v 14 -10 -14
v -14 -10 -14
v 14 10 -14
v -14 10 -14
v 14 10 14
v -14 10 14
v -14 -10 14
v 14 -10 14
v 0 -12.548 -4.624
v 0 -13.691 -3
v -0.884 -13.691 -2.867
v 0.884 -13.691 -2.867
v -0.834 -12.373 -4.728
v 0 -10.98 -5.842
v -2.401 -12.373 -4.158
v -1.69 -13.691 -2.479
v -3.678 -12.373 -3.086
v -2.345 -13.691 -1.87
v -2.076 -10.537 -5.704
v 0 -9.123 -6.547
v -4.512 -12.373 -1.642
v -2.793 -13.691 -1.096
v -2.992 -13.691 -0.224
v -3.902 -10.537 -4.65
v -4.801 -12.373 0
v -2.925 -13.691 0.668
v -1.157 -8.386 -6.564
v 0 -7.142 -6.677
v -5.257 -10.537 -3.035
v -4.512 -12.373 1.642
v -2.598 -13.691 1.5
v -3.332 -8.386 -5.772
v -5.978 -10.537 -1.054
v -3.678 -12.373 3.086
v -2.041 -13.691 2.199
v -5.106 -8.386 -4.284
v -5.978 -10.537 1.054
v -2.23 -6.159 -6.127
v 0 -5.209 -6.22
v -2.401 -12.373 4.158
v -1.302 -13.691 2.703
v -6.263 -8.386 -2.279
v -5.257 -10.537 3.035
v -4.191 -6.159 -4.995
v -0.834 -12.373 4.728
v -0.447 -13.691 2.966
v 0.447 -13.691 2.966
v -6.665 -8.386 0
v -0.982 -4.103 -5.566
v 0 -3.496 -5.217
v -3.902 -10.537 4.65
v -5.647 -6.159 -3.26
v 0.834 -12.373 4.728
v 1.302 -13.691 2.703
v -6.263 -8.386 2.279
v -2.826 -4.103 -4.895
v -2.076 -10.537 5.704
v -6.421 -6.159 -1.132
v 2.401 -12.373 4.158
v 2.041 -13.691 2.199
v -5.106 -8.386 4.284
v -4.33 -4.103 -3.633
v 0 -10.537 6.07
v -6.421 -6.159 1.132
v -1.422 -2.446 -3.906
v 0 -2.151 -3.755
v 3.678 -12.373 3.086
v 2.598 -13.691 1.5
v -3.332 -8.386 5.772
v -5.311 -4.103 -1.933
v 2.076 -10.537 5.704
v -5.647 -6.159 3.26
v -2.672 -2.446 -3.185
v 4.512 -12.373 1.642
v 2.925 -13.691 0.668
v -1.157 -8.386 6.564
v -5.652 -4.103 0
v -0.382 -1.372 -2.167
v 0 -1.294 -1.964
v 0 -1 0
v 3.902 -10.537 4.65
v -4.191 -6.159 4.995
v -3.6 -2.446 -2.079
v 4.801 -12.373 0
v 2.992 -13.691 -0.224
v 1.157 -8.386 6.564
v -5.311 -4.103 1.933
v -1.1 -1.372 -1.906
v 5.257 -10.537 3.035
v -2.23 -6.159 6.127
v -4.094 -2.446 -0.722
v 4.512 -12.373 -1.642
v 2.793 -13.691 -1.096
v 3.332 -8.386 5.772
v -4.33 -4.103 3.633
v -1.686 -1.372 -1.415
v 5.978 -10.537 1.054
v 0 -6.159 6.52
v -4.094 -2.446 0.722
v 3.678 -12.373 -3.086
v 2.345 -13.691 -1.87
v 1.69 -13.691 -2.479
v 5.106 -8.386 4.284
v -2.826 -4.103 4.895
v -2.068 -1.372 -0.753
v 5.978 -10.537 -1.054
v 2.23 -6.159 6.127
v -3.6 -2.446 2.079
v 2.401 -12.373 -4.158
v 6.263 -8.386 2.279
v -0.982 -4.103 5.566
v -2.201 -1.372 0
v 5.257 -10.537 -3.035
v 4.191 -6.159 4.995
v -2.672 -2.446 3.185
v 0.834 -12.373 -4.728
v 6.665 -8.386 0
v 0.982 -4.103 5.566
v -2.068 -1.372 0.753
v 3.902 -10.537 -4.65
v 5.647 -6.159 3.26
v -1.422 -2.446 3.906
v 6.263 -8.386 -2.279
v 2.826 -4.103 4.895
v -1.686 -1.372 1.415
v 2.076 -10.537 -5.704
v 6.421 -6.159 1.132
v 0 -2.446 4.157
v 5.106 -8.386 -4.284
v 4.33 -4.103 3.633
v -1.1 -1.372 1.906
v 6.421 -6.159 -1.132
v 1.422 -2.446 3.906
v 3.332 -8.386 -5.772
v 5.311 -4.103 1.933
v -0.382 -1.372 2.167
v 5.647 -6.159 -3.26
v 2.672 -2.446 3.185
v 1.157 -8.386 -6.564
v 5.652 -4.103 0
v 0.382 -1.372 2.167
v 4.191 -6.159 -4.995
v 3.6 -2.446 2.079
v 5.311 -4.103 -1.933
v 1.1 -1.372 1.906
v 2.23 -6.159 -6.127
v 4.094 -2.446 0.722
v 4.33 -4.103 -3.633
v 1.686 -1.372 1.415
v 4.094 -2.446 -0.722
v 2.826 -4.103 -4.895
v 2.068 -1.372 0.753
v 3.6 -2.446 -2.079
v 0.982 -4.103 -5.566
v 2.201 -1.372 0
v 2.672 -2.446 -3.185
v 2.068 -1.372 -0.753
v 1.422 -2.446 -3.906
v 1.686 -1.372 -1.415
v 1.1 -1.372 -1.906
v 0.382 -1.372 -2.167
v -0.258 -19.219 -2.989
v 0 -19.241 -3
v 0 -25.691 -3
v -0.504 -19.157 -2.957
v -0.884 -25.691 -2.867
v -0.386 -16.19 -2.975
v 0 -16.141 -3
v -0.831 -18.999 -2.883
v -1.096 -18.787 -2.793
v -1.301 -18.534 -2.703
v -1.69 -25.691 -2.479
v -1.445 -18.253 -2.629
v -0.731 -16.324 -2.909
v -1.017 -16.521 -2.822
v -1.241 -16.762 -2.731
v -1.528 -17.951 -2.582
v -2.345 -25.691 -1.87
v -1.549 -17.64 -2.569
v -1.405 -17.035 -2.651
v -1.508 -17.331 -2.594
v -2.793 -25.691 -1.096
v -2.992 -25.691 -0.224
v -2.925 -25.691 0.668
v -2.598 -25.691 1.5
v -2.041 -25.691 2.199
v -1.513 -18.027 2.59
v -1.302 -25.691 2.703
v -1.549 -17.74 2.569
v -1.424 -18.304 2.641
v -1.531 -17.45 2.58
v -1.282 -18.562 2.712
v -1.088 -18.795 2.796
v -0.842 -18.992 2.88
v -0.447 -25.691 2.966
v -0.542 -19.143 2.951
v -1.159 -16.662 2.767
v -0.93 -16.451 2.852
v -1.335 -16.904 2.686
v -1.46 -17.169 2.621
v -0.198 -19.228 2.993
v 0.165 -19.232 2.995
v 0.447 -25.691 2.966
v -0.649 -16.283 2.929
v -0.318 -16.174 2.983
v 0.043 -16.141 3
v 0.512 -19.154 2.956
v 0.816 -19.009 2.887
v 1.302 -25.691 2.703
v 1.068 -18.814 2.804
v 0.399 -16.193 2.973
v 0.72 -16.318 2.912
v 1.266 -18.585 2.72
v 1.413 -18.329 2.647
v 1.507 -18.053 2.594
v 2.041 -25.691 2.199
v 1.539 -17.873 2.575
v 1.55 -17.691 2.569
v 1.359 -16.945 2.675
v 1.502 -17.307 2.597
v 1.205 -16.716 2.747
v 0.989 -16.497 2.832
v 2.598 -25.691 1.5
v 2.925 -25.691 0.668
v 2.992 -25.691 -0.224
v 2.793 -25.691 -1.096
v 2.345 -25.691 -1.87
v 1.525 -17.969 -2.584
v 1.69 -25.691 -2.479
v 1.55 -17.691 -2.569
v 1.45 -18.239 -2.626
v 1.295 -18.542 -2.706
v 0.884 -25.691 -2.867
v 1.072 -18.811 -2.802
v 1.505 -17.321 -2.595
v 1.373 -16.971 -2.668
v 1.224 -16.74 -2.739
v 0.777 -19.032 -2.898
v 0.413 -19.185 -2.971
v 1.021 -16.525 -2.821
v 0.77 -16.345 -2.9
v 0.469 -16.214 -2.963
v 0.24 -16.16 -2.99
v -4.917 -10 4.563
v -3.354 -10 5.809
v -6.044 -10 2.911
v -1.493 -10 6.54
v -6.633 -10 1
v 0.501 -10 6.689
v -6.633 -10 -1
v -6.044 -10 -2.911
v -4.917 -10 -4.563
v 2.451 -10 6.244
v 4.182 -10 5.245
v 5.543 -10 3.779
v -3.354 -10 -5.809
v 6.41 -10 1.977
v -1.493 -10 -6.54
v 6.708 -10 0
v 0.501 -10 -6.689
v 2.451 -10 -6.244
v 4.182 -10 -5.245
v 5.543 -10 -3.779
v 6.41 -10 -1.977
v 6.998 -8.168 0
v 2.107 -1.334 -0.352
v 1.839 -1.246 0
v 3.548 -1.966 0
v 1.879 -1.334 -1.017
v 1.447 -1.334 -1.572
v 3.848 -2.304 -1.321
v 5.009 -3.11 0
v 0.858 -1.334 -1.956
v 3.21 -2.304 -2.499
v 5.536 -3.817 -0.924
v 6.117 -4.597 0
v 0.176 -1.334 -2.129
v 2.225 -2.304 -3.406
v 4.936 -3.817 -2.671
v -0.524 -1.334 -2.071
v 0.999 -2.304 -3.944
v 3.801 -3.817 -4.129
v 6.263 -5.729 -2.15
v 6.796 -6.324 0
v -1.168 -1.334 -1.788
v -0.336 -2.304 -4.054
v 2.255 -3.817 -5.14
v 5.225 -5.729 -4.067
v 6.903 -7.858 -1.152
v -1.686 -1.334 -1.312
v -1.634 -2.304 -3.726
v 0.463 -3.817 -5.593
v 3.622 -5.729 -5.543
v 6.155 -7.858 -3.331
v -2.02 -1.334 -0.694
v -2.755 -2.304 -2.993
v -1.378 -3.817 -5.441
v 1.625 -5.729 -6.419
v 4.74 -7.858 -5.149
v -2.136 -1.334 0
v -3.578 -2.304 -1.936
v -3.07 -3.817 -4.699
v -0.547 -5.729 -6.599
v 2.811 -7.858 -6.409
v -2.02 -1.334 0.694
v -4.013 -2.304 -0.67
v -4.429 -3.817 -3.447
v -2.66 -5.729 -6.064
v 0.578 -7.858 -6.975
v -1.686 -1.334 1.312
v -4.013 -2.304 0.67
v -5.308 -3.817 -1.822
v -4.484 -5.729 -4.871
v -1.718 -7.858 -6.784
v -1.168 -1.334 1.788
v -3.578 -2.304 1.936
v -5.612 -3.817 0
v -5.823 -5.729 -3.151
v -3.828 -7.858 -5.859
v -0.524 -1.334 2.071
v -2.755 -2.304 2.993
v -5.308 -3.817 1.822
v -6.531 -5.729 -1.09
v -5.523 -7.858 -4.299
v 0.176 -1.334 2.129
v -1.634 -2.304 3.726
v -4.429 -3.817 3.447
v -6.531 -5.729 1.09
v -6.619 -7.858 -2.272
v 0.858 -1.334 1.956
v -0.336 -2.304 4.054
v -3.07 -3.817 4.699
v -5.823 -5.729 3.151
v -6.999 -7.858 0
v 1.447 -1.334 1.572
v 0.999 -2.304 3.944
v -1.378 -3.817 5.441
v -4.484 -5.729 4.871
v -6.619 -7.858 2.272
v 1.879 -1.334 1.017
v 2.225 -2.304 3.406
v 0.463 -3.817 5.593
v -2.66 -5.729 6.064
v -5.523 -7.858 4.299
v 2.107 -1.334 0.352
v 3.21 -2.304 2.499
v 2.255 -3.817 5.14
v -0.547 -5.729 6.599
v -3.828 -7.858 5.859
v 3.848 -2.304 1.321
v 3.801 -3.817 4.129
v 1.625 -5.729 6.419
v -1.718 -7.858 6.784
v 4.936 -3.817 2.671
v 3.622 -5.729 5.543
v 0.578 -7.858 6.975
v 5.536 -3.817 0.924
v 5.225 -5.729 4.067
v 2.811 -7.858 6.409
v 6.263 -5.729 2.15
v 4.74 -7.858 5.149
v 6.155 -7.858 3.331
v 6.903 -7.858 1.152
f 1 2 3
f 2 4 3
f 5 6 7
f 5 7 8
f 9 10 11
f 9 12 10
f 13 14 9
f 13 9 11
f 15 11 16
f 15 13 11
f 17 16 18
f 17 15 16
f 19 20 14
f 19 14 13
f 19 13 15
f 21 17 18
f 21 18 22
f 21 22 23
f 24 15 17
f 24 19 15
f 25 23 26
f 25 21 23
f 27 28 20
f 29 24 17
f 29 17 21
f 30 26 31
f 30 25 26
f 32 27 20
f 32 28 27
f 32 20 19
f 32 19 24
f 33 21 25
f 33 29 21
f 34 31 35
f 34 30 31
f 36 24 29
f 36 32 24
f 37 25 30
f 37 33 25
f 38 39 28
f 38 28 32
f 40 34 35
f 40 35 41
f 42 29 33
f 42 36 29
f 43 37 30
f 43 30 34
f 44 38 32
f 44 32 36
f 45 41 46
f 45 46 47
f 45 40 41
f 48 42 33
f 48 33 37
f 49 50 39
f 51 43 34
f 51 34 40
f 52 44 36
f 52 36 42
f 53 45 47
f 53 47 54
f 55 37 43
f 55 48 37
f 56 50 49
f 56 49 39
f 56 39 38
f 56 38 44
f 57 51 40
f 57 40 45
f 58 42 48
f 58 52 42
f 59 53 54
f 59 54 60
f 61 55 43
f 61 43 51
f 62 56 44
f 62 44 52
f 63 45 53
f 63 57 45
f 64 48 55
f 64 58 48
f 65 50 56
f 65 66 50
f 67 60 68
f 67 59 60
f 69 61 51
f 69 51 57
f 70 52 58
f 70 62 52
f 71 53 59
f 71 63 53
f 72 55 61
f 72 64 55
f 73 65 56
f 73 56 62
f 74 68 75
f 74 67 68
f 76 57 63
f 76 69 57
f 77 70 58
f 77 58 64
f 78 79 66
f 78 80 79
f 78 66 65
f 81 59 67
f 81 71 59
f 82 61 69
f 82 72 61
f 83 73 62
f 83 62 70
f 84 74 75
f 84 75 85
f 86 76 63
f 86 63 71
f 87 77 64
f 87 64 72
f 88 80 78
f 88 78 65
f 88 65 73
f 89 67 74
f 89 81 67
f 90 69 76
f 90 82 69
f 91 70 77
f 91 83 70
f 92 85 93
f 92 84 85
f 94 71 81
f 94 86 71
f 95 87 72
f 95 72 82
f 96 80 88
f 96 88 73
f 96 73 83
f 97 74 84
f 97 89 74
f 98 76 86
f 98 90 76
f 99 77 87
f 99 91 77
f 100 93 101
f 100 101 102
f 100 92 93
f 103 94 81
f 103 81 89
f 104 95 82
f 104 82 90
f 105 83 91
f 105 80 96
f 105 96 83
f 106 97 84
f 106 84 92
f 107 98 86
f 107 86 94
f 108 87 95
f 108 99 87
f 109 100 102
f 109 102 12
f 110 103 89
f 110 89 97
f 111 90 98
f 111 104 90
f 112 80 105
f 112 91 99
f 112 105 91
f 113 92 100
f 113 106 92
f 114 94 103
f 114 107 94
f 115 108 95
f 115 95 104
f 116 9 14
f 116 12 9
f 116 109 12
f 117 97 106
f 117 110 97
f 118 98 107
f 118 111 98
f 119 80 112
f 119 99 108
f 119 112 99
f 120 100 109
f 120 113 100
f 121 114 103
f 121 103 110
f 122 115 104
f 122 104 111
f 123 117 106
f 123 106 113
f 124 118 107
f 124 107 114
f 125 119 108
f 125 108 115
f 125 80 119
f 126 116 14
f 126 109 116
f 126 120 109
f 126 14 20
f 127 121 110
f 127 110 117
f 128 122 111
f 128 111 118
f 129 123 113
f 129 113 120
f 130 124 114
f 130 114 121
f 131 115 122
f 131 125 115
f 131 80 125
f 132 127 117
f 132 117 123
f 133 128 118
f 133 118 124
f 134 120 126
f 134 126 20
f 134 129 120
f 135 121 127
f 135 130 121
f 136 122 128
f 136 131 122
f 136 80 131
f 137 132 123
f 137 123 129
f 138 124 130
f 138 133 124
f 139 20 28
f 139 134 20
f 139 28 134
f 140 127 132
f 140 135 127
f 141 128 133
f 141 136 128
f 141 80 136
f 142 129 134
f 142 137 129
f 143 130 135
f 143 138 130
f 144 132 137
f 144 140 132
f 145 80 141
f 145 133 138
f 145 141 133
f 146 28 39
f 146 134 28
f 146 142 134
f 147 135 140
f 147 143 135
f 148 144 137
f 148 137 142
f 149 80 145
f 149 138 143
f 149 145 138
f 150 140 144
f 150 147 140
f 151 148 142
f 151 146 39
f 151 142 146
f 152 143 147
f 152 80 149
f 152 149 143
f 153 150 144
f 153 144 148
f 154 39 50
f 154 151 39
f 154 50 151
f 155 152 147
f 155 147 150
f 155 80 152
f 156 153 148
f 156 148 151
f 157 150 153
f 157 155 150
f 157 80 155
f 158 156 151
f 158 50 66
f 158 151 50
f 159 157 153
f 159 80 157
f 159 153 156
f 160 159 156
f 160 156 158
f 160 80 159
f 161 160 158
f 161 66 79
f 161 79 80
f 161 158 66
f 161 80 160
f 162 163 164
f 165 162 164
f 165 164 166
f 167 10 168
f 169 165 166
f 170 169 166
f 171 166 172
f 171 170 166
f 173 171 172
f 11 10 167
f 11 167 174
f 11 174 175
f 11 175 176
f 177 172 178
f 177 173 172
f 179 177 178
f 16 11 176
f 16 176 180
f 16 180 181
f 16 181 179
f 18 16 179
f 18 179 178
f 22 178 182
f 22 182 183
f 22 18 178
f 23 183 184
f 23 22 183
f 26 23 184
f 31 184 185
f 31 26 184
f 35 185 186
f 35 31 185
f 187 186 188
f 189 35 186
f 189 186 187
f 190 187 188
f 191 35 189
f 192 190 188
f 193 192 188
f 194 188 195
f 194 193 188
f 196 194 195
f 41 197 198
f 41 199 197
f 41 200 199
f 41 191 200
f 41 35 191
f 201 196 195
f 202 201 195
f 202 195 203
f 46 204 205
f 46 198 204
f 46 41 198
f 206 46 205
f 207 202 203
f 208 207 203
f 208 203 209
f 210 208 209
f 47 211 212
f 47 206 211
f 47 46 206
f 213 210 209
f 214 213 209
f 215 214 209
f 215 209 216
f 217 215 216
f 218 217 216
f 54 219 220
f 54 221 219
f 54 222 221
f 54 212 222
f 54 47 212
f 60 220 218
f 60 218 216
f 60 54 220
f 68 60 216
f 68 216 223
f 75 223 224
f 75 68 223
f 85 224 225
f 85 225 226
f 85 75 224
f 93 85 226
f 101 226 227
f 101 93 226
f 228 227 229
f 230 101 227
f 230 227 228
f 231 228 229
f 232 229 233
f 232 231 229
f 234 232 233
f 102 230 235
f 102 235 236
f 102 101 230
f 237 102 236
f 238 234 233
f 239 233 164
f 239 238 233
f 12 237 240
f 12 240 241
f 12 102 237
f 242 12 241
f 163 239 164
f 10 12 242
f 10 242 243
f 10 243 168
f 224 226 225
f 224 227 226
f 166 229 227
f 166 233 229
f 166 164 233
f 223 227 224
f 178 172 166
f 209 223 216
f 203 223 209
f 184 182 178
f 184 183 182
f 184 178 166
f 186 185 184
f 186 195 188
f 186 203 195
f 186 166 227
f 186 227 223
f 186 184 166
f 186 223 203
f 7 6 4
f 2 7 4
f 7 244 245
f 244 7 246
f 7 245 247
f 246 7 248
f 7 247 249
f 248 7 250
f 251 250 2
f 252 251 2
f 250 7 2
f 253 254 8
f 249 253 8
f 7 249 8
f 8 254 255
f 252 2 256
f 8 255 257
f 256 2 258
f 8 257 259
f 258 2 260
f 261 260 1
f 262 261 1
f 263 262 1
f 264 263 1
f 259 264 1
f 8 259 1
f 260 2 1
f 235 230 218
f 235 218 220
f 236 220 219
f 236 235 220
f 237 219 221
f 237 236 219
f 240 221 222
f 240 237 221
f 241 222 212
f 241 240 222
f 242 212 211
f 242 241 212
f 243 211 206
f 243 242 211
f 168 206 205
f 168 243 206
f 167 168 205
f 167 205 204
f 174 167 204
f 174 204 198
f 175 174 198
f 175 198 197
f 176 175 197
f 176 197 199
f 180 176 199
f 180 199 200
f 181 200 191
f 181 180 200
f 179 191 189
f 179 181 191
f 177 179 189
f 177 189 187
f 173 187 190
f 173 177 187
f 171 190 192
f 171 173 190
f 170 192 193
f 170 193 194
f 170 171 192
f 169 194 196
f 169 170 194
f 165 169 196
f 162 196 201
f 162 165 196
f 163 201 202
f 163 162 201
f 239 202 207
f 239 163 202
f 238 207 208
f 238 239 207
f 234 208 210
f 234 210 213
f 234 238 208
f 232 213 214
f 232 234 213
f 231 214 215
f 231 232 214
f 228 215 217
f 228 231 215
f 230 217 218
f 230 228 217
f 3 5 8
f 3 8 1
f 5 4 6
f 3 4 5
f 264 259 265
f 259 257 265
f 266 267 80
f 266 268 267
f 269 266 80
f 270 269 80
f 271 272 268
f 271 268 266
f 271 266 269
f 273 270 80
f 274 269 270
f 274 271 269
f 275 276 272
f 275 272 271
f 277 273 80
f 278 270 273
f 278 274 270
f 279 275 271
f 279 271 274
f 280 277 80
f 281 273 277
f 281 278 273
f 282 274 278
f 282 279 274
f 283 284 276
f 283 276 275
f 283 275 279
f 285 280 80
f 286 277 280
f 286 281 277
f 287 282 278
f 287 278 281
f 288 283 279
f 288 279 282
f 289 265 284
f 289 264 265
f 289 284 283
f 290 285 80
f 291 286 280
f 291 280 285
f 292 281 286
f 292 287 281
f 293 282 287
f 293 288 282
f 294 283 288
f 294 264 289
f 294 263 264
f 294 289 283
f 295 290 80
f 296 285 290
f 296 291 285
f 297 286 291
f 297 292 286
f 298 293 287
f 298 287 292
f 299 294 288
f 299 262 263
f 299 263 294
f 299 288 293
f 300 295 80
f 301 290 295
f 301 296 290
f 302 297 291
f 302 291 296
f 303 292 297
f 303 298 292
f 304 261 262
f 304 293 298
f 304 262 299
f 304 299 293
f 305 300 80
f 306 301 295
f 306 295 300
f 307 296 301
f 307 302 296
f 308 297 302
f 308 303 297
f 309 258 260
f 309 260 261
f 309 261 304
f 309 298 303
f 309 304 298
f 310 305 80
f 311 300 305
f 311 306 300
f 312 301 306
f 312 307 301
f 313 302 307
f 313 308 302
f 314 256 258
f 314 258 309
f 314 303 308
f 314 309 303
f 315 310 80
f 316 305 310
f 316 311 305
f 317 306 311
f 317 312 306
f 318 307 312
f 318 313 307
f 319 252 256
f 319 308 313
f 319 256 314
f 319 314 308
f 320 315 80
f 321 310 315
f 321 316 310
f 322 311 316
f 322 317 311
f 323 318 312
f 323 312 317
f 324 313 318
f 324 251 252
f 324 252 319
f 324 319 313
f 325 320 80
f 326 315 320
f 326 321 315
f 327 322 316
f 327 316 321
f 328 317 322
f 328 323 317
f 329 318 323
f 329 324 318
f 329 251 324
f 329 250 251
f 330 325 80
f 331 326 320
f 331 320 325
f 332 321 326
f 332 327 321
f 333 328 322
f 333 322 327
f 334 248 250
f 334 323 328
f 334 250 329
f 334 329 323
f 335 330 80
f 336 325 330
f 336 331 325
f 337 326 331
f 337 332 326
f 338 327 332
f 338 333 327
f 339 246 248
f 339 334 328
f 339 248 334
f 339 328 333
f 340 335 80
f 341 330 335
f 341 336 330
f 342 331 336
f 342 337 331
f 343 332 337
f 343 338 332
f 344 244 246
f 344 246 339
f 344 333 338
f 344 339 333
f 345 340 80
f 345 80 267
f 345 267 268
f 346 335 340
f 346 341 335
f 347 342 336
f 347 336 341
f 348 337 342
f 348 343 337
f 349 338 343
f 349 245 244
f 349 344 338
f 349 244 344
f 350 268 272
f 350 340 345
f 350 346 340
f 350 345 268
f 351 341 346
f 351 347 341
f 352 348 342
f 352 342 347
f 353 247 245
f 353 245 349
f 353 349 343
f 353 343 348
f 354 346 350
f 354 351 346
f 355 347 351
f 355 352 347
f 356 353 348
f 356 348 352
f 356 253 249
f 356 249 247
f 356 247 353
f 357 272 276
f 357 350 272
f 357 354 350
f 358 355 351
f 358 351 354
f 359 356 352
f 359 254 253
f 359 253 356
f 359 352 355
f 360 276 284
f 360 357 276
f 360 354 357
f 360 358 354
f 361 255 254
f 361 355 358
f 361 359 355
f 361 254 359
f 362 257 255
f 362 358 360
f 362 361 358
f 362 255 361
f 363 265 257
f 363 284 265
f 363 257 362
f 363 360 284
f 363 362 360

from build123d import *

# Parameters (mm, degrees)
SKETCH1_W               = 28
SKETCH1_H               = 28
BOSS_EXTRUDE1_DEPTH     = 10
CUT_EXTRUDE1_DEPTH      = 41.497142578
CUT_EXTRUDE1_DEPTH_BACK = 41.497142578
SKETCH4_R               = 1.55


with BuildPart() as part:
    # Sketch1 → Boss-Extrude1 (new, symmetric)
    with BuildSketch(Plane(origin=(0, 0, 0), x_dir=(1, 0, 0), z_dir=(0, 1, 0))):
        Rectangle(SKETCH1_W, SKETCH1_H)
    extrude(amount=BOSS_EXTRUDE1_DEPTH, both=True)

    # Sketch2 → Cut-Revolve1 (revolve, cut)
    with BuildSketch(Plane.XY):
        with BuildLine():
            Line((0, -15), (0, -1))
            ThreePointArc((0, -1), (7, -8), (0, -15))
        make_face()
    revolve(axis=Axis((0, -15, 0), (0, 1, 0)), mode=Mode.SUBTRACT)


with BuildPart() as body_2:
    # Sketch3 → Revolve1 (revolve)
    with BuildSketch(Plane.XY, mode=Mode.PRIVATE) as revolve1_sk:
        with BuildLine():
            Line((0, -1), (0, -14.4))
            Line((0, -14.4), (0, -25.69082632))
            Line((0, -25.69082632), (3, -25.69082632))
            Line((3, -25.69082632), (3, -13.69082632))
            ThreePointArc((3, -13.69082632), (6.520296632, -6.158659082), (0, -1))
        make_face()
    revolve(revolve1_sk.sketch.rotate(Axis((0, -15, 0), (0, 1, 0)), 90), axis=Axis((0, -15, 0), (0, 1, 0)))

    # Sketch4 → Cut-Extrude1 (cut, two sides: drawn at the far end of the back side and taken through both)
    with BuildSketch(Plane.XY.offset(14).offset(-CUT_EXTRUDE1_DEPTH_BACK)):
        with Locations((0, -17.69082632)):
            Circle(SKETCH4_R)
    extrude(amount=CUT_EXTRUDE1_DEPTH + CUT_EXTRUDE1_DEPTH_BACK, mode=Mode.SUBTRACT)


solid = Compound([part.part, body_2.part])
